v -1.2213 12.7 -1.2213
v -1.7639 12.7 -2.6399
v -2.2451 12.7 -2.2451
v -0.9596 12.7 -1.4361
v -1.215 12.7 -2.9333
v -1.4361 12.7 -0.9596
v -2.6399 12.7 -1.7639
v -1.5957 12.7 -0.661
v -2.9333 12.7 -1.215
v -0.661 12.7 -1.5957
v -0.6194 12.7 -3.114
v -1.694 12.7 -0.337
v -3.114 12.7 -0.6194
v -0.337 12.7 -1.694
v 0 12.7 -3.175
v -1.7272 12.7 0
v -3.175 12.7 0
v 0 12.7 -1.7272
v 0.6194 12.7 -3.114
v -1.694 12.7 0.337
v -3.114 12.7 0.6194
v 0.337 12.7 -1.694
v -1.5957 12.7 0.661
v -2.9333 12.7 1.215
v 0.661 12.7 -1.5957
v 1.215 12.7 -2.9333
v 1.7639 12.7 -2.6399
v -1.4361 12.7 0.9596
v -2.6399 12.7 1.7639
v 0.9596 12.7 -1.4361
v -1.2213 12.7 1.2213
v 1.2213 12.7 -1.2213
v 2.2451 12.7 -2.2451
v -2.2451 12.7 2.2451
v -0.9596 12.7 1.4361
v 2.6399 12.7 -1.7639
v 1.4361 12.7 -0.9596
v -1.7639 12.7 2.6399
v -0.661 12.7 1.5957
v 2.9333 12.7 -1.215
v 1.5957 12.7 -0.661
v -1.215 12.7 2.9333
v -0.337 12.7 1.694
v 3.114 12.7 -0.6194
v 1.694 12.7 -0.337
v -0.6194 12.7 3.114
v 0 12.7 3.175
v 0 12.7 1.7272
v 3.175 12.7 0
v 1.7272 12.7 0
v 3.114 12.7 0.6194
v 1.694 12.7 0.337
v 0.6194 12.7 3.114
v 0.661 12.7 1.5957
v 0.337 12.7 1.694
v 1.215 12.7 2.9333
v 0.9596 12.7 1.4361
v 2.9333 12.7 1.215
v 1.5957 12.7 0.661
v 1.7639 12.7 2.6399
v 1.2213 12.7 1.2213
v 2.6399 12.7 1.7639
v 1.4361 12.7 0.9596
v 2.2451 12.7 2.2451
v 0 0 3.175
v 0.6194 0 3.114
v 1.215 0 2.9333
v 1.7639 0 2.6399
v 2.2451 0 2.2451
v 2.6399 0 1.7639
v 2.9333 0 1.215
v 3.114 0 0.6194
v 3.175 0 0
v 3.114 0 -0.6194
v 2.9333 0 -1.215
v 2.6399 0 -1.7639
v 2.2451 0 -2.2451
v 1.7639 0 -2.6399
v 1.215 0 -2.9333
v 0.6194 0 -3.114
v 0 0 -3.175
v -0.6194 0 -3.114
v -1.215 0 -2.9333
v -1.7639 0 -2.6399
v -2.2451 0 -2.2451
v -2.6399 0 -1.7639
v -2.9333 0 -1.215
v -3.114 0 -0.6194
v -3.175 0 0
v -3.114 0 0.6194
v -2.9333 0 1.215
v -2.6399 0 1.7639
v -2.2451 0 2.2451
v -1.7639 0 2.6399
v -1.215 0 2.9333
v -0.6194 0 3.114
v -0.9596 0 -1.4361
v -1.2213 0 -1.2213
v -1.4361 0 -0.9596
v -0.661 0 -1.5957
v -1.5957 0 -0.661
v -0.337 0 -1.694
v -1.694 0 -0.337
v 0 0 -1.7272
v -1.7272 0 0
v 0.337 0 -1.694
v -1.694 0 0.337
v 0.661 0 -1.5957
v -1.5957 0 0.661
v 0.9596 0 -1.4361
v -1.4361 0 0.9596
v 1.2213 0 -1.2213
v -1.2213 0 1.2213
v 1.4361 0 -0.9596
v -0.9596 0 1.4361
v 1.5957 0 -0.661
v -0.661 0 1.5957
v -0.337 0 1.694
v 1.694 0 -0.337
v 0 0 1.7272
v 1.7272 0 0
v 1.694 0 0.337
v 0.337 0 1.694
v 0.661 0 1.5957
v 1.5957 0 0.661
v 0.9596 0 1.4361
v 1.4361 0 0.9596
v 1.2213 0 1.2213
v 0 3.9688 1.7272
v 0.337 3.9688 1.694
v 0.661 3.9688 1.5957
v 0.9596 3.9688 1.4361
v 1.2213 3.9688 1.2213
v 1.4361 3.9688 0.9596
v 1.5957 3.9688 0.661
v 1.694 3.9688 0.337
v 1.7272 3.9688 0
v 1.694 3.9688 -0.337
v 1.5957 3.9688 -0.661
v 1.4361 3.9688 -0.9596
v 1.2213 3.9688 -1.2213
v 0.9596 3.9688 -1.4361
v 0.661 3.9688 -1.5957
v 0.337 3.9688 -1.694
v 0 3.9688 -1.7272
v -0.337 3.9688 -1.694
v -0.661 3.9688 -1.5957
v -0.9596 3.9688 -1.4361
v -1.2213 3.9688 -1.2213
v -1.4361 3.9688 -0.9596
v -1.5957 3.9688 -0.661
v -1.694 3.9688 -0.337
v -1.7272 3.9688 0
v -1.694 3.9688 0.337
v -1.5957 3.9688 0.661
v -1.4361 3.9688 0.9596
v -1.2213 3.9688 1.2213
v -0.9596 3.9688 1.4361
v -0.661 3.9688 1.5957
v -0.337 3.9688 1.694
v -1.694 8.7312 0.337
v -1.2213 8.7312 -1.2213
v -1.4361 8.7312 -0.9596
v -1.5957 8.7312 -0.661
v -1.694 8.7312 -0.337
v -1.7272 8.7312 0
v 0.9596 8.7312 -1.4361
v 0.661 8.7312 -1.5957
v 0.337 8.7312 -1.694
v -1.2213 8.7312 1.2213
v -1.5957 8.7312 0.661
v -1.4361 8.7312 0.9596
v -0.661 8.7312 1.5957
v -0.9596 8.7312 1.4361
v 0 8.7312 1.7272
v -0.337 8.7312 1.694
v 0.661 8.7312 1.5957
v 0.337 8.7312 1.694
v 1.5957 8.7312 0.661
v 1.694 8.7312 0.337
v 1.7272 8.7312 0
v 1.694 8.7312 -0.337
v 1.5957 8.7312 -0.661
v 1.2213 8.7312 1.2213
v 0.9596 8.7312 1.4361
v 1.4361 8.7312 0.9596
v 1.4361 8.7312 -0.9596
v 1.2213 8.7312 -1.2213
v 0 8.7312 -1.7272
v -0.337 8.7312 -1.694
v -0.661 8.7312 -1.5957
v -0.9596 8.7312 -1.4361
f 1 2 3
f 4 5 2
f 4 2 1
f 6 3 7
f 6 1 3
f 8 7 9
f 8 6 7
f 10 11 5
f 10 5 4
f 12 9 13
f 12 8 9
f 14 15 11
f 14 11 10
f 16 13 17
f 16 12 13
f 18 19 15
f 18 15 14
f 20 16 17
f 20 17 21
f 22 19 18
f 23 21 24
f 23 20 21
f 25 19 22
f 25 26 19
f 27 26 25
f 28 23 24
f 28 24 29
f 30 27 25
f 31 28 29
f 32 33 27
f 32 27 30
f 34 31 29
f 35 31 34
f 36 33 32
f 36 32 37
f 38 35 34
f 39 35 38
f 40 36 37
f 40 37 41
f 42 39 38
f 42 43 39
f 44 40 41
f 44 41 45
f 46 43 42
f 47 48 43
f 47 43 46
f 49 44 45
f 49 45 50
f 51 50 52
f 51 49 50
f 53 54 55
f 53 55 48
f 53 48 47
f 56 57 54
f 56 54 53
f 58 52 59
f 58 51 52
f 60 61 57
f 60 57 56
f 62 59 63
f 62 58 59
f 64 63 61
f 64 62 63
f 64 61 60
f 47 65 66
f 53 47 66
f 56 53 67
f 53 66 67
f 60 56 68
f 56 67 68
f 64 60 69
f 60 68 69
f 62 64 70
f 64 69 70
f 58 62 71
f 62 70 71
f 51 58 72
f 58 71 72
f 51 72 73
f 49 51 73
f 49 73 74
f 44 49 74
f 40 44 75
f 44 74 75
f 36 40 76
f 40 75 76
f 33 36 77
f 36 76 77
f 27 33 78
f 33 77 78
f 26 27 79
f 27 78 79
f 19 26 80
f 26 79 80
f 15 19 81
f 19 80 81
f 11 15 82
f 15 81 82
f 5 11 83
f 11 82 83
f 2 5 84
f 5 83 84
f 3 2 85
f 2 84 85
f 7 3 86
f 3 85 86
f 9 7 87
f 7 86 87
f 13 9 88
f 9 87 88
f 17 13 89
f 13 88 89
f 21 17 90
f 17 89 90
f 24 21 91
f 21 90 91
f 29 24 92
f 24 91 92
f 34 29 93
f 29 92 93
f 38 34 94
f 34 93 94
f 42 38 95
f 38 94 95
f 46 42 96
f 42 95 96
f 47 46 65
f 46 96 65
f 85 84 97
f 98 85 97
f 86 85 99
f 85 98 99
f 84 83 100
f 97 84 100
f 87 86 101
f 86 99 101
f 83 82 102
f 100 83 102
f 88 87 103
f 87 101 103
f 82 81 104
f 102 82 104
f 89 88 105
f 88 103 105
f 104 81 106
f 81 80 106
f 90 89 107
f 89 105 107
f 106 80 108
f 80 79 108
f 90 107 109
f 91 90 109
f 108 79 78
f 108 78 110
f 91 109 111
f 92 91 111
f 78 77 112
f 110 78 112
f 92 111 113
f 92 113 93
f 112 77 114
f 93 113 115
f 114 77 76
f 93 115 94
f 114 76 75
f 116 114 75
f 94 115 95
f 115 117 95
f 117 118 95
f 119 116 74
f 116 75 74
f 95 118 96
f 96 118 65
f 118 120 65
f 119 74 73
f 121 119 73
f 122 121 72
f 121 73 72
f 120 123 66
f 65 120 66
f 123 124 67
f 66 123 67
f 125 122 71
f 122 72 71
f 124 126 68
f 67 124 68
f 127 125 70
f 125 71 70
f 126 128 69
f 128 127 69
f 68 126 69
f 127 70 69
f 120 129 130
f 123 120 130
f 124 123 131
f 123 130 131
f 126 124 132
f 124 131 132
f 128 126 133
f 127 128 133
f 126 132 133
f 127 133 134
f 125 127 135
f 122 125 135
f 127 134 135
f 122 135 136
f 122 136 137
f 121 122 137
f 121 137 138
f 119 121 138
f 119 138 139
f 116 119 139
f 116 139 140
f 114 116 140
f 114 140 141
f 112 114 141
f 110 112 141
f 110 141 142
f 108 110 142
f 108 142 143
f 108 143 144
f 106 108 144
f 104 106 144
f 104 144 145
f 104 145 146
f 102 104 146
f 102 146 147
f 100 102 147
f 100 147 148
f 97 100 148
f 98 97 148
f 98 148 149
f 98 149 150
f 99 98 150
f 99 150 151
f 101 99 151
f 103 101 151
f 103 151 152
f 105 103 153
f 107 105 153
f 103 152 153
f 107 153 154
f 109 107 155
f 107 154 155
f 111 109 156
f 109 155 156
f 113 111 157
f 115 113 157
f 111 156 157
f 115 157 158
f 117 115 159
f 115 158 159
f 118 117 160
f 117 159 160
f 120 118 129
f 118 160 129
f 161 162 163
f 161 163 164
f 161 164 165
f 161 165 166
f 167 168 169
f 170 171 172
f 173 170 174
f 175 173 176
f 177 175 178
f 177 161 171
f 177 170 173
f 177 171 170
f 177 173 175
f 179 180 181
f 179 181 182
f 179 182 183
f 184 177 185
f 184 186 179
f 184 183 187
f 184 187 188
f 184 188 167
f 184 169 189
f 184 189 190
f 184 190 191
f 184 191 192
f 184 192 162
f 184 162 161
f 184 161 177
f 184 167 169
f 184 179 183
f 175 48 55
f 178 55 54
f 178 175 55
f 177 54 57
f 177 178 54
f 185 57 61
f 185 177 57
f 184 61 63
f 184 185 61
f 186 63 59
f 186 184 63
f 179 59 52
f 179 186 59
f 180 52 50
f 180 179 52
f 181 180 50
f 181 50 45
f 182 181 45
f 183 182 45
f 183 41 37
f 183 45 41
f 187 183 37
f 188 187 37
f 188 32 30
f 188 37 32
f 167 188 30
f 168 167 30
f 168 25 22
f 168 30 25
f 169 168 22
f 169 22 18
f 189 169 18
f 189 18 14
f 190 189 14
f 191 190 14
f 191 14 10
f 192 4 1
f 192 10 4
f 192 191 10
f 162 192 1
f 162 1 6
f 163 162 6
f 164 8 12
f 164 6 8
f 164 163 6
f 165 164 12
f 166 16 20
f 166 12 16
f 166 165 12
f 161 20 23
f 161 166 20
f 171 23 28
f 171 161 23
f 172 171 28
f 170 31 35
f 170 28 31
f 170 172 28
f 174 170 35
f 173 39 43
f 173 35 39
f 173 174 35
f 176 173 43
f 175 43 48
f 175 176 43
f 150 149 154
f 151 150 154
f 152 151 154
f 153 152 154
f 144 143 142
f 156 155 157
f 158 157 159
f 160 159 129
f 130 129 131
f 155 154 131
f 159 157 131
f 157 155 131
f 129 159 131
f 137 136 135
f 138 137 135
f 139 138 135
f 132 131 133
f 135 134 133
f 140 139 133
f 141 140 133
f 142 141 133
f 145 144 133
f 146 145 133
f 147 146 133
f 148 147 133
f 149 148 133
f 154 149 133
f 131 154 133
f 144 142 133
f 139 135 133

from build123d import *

# Parameters (mm, degrees)
SKETCH1_R           = 3.175
BOSS_EXTRUDE1_DEPTH = 12.7
CUT_EXTRUDE1_START  = -3.96875
SKETCH2_R           = 1.7272
CUT_EXTRUDE1_DEPTH  = 18.439134182


with BuildPart() as part:
    # Sketch1 → Boss-Extrude1 (new body)
    with BuildSketch(Plane(origin=(0, 0, 0), x_dir=(1, 0, 0), z_dir=(0, 1, 0))):
        with Locations(Location((0, 0, 0), (0, 0, 270))):
            Circle(SKETCH1_R)
    extrude(amount=BOSS_EXTRUDE1_DEPTH)

    # Sketch2 → Cut-Extrude1 (cut)
    with BuildSketch(Plane(origin=(0, 12.7, 0), x_dir=(1, 0, 0), z_dir=(0, 1, 0)).offset(CUT_EXTRUDE1_START)):
        with Locations(Location((0, 0, 0), (0, 0, 270))):
            Circle(SKETCH2_R)
    cut_extrude1 = extrude(amount=CUT_EXTRUDE1_DEPTH, mode=Mode.SUBTRACT)

    # Mirror1: Cut-Extrude1 across plane
    add(cut_extrude1.mirror(Plane.ZX.offset(6.35)), mode=Mode.SUBTRACT)


solid = part.part
